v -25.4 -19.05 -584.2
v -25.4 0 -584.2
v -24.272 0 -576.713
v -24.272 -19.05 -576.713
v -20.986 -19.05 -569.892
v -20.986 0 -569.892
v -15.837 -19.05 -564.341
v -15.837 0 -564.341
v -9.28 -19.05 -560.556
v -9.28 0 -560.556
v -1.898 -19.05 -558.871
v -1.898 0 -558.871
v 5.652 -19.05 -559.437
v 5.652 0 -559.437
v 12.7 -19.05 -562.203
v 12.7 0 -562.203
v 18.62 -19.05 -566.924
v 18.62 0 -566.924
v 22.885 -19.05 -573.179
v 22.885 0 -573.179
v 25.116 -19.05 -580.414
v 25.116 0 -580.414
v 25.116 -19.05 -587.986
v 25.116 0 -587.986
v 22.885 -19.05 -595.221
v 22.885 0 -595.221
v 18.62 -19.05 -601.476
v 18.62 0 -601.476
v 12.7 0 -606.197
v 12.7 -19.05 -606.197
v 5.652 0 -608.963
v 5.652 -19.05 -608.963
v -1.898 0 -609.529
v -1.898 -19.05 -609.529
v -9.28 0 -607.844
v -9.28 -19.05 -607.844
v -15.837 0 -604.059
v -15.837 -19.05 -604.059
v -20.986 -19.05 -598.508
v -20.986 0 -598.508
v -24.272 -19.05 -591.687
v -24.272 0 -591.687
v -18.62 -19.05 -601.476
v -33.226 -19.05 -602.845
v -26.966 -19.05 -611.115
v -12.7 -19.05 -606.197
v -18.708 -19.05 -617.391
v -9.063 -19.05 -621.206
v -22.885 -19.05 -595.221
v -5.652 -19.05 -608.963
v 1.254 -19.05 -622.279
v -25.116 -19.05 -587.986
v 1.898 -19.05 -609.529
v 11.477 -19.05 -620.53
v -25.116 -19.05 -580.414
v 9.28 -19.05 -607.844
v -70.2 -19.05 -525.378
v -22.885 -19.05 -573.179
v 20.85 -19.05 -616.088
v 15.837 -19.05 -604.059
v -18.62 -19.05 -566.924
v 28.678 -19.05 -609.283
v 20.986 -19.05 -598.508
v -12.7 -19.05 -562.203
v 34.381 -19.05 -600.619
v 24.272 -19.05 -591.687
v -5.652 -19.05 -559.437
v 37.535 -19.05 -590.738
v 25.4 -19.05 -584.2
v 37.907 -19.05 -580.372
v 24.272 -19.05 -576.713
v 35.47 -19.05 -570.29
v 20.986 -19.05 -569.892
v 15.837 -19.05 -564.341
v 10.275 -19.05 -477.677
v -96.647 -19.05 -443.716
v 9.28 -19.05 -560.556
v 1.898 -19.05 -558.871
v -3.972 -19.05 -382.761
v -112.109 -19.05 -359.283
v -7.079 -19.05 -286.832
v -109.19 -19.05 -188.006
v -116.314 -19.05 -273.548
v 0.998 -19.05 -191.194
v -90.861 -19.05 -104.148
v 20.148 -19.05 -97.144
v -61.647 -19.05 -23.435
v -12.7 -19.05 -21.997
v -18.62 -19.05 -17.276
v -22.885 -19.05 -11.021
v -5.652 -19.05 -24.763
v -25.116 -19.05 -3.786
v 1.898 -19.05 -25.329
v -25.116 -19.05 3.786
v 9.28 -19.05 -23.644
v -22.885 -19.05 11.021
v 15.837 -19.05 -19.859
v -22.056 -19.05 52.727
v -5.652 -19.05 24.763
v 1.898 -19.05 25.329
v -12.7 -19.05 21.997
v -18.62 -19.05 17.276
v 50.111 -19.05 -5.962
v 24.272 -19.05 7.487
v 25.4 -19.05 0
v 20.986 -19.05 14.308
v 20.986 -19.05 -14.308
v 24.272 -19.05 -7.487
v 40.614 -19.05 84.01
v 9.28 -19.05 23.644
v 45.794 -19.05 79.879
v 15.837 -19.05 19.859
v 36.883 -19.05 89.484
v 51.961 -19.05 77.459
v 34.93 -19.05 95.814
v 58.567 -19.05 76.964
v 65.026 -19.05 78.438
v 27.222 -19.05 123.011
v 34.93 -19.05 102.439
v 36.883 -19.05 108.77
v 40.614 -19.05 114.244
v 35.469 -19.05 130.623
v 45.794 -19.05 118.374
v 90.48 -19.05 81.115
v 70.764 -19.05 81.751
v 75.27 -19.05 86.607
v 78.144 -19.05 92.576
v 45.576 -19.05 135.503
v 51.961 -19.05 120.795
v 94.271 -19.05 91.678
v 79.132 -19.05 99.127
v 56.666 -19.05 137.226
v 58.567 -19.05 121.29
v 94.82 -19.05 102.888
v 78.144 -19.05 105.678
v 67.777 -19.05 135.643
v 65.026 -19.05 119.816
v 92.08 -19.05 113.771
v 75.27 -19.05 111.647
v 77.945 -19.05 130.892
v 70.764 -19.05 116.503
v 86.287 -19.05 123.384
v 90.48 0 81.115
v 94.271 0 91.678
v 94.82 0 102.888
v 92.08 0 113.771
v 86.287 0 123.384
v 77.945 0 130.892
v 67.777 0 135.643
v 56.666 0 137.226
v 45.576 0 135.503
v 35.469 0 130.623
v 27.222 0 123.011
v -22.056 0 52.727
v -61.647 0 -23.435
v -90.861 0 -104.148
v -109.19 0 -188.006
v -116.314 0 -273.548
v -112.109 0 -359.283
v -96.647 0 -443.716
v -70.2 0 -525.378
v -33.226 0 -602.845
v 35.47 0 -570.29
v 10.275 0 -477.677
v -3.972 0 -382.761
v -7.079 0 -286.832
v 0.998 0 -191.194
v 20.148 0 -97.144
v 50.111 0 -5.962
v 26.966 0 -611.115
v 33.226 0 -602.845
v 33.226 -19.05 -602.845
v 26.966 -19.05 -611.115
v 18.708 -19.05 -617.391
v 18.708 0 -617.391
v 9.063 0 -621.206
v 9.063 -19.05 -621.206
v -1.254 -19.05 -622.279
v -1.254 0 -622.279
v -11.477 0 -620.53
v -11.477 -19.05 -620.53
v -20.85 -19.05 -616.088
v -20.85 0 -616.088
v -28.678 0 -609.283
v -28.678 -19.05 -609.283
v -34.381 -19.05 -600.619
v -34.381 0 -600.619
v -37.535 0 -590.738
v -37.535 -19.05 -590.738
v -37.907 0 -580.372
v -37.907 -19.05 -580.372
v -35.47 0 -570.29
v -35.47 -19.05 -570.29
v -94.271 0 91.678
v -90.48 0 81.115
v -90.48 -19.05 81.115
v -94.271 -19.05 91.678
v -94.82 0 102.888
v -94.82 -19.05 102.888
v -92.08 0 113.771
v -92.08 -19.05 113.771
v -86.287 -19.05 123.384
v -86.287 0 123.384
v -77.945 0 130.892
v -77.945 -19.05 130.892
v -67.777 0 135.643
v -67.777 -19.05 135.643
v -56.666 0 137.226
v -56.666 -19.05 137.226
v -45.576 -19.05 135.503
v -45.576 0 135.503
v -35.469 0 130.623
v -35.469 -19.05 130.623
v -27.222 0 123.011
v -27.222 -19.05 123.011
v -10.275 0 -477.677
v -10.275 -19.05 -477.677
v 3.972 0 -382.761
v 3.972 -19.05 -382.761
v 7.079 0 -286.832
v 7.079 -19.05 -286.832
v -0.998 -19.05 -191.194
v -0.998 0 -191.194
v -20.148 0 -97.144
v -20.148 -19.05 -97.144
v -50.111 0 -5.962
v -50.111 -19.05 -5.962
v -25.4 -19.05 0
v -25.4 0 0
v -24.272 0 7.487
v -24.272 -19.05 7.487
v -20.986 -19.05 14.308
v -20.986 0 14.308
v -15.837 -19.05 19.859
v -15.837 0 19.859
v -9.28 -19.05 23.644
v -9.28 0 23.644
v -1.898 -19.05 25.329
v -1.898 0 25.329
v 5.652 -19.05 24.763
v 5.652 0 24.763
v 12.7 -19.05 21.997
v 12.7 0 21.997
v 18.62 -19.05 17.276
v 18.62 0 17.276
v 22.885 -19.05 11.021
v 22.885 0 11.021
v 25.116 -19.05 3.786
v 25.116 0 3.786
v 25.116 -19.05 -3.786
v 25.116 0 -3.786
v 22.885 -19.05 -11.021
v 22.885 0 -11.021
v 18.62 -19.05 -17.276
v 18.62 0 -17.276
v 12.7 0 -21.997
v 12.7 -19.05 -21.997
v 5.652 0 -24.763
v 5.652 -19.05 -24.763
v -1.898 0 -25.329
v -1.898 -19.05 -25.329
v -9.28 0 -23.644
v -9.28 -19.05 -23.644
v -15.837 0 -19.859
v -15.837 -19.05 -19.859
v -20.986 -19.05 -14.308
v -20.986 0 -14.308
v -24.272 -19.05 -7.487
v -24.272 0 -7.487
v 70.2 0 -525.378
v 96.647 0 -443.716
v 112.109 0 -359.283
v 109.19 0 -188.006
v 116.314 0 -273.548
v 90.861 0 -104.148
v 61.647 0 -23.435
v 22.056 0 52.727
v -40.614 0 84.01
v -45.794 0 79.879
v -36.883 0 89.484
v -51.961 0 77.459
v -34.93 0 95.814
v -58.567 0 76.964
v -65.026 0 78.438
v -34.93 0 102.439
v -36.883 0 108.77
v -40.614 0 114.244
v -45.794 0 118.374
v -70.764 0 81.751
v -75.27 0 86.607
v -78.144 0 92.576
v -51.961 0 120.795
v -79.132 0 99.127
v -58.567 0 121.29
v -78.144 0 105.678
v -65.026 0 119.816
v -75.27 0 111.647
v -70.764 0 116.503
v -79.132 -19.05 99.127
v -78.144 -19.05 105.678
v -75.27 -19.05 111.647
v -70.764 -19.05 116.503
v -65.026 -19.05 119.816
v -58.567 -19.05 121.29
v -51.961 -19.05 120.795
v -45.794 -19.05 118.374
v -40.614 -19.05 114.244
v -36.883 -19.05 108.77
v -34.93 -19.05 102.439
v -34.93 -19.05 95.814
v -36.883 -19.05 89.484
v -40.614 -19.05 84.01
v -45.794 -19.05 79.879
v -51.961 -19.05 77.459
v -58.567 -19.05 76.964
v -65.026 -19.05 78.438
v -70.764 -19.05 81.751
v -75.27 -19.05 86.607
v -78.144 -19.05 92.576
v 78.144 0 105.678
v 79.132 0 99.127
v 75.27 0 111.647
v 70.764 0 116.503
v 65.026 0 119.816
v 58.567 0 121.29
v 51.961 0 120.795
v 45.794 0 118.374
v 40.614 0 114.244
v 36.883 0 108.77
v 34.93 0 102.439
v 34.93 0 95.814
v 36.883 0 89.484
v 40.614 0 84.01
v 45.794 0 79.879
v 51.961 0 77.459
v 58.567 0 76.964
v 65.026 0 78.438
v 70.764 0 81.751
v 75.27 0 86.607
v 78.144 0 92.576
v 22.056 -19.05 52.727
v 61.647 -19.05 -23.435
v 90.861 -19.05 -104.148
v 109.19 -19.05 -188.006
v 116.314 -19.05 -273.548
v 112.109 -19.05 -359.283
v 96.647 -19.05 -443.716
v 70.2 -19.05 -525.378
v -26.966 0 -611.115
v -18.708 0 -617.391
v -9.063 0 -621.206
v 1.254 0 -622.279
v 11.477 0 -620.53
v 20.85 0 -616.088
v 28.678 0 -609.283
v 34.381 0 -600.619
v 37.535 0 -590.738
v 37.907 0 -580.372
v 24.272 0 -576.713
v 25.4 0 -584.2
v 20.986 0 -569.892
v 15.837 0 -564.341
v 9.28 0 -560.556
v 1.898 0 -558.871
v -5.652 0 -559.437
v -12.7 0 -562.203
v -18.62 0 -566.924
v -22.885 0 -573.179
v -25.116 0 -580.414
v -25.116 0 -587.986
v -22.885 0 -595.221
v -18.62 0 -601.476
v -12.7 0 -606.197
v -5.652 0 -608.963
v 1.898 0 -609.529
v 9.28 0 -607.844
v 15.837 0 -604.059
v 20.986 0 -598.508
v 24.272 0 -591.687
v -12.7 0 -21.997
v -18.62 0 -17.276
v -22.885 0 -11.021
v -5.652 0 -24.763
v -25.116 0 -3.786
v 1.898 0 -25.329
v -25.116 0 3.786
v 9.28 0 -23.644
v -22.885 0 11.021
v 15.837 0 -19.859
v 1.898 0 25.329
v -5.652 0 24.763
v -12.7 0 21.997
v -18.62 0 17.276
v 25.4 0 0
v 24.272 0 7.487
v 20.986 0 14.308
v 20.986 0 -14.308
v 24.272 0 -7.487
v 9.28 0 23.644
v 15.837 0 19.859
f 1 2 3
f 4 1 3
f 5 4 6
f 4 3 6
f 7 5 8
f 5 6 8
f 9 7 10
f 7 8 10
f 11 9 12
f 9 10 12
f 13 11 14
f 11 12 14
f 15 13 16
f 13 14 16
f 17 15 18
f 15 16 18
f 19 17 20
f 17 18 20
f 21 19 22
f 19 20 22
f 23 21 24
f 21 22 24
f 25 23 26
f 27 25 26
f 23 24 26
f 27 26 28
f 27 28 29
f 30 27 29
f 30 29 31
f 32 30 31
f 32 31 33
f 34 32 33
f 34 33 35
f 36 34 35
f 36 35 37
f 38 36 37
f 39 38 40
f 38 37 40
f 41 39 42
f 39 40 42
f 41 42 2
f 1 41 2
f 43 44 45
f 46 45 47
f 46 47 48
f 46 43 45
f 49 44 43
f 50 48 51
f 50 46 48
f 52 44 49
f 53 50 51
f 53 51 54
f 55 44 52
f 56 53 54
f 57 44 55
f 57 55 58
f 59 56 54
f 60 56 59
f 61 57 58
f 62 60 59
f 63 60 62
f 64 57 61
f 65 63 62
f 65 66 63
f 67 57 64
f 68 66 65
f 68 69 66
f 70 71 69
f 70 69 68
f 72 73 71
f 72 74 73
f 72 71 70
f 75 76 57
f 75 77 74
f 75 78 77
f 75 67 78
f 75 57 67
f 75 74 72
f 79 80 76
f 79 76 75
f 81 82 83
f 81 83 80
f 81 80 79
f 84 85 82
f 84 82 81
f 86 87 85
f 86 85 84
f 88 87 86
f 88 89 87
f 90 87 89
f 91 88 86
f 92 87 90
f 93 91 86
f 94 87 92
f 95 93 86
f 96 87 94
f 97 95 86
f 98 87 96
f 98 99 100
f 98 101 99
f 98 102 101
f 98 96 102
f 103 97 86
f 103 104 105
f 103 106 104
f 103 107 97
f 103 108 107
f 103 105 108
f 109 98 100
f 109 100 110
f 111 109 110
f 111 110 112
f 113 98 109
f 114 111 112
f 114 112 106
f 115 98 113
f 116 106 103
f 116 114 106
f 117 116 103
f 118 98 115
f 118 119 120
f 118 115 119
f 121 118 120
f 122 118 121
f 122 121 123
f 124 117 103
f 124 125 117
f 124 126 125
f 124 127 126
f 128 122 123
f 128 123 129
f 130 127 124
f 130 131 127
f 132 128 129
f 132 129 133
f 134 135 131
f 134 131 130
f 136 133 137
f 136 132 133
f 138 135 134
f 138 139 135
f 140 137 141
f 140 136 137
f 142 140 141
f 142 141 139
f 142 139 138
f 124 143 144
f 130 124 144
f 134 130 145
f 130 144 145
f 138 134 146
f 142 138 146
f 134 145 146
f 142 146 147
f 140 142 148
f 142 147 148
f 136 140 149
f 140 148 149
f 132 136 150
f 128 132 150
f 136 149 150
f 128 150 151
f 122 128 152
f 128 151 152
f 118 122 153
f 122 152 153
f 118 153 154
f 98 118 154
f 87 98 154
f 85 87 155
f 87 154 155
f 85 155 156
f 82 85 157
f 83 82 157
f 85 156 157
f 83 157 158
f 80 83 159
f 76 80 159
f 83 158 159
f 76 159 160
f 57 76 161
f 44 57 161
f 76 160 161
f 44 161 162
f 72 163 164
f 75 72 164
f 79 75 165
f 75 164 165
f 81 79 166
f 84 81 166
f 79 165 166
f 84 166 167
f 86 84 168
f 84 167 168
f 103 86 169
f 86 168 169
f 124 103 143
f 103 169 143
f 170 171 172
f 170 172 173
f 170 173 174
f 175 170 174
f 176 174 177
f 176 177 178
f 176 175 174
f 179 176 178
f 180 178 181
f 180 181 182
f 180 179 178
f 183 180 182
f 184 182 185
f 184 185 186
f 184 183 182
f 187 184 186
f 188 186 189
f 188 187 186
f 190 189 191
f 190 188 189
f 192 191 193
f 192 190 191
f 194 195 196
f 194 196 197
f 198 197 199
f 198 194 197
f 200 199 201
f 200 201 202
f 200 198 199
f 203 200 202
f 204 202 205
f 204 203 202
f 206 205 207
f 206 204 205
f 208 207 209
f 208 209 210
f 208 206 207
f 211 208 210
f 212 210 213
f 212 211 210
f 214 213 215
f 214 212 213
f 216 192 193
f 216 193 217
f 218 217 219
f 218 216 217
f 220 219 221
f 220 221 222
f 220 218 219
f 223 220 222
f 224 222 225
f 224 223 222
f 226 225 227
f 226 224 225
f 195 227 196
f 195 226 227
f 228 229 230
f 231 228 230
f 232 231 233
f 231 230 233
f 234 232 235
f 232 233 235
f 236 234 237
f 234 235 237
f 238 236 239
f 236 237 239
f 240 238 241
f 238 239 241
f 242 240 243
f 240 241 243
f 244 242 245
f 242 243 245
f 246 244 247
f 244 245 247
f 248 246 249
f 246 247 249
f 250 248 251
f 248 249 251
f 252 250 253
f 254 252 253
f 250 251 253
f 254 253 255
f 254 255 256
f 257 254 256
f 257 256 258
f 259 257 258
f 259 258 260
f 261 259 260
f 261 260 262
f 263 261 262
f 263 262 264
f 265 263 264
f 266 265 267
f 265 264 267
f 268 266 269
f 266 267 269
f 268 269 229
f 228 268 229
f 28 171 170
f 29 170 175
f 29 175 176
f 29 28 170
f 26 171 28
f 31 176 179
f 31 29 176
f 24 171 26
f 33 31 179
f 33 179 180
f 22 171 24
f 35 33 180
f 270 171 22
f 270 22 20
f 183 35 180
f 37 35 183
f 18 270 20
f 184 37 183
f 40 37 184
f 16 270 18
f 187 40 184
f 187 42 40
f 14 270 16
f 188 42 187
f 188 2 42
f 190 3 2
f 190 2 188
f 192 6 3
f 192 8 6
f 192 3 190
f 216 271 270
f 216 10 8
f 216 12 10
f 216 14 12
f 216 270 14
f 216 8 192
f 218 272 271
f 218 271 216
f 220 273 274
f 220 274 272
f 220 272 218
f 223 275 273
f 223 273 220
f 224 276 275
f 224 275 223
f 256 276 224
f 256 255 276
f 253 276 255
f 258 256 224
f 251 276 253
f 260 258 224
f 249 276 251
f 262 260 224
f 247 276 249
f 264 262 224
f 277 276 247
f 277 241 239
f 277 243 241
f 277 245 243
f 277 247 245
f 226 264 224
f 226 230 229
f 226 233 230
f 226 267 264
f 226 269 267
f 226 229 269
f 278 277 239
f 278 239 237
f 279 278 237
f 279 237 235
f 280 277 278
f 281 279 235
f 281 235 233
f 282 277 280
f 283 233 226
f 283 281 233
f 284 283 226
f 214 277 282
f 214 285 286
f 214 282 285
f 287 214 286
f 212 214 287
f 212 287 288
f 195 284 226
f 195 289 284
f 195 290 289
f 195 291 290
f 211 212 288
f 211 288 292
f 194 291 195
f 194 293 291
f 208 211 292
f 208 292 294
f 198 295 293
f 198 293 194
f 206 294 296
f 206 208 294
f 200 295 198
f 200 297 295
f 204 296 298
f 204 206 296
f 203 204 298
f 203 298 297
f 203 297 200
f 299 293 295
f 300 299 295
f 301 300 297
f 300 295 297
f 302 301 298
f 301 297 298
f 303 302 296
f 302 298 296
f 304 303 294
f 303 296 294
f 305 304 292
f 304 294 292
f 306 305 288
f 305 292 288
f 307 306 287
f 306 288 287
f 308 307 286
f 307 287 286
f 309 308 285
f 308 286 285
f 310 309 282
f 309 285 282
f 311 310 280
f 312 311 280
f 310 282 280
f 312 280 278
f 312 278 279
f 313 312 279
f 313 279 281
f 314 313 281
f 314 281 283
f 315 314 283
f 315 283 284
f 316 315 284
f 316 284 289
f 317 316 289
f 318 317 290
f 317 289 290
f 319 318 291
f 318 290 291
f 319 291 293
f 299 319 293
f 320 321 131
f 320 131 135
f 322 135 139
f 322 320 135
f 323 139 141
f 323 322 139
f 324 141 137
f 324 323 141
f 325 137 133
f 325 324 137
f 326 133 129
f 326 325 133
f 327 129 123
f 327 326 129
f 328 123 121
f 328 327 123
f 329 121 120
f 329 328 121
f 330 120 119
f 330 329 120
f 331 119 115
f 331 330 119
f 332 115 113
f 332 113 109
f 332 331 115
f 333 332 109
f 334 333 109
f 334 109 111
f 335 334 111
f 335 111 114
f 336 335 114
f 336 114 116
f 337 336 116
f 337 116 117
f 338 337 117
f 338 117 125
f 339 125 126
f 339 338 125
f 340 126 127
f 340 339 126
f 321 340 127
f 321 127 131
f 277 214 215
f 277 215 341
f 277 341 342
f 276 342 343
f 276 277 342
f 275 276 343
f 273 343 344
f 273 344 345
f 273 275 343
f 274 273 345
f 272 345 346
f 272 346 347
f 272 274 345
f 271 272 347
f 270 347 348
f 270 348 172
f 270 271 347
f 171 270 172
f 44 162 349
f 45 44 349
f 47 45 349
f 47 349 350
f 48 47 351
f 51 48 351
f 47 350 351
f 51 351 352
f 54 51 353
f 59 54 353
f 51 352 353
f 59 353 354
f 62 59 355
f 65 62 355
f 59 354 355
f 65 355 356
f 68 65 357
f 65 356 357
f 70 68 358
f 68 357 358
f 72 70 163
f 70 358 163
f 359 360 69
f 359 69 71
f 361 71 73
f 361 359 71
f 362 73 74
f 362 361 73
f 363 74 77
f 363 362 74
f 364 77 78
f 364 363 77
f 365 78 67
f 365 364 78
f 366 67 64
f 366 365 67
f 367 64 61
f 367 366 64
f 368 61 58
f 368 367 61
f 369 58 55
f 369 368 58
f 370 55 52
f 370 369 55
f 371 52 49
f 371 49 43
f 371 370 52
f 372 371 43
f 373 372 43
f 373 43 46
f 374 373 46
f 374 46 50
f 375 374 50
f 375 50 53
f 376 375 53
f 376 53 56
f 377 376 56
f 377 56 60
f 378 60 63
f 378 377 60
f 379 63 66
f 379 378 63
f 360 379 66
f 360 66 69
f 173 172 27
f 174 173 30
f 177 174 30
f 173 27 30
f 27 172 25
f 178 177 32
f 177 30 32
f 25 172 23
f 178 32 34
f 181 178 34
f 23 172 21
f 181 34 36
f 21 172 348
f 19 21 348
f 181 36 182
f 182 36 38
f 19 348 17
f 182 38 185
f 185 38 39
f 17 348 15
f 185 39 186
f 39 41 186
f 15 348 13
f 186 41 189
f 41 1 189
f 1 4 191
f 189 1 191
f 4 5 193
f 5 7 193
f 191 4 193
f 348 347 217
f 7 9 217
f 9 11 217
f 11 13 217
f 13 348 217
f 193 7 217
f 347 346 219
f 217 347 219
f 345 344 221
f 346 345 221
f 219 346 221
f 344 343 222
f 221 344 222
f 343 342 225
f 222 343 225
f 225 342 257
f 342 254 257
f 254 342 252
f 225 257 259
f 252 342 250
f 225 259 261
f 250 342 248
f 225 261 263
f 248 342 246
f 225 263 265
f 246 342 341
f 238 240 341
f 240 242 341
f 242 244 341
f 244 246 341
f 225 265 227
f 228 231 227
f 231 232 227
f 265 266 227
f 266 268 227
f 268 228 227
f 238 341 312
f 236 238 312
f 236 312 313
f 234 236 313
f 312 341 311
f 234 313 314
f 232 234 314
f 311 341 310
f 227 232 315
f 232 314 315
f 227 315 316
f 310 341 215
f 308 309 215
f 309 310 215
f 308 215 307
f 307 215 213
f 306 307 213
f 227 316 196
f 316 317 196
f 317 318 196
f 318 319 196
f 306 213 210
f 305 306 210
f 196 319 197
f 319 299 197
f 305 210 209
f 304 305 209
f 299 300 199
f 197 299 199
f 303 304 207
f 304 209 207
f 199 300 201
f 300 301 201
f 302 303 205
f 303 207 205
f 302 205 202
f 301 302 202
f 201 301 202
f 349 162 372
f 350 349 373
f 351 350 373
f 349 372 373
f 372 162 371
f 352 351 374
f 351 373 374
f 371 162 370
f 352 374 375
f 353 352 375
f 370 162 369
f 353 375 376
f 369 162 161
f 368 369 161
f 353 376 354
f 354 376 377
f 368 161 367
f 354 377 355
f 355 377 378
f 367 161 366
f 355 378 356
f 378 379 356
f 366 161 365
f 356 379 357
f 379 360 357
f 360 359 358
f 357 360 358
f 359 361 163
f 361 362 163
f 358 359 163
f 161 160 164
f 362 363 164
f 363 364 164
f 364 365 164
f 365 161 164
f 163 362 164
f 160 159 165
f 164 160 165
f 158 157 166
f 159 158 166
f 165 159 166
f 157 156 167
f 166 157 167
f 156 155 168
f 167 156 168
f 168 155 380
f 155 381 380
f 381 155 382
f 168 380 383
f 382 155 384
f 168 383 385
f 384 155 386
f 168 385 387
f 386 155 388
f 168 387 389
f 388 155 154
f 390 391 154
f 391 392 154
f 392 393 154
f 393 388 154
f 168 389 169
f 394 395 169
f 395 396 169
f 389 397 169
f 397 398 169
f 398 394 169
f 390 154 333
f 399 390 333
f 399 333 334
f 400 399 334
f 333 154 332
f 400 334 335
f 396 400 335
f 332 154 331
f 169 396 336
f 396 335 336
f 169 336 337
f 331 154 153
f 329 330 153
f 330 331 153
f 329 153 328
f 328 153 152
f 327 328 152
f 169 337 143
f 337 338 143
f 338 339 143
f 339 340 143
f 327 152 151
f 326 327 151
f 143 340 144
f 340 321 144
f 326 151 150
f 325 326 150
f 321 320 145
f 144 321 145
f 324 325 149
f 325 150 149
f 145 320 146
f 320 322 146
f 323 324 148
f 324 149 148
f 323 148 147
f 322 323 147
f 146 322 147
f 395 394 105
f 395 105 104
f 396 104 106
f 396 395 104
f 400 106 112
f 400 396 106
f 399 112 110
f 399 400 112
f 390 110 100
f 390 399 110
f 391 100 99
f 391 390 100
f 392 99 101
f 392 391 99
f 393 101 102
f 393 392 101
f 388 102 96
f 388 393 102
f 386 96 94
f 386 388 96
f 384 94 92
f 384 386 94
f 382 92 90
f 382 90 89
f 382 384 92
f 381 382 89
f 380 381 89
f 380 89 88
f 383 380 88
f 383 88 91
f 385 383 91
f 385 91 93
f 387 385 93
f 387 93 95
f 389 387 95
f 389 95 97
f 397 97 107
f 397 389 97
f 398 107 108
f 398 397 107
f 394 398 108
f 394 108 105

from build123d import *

# Parameters (mm, degrees)
F0_R     = 25.4
F0_R_2   = 22.225
F1_DEPTH = 19.05


with BuildPart() as f1:
    # F0 (on Front) → F1 (new body)
    with BuildSketch(Plane.XZ):
        with BuildLine():
            ThreePointArc((27.221969, 123.01068), (-114.165221, -230.659491), (-33.226283, -602.844681))
            ThreePointArc((-33.226283, -602.844681), (16.315724, -618.629742), (35.470201, -570.290476))
            ThreePointArc((35.470201, -570.290476), (-4.434873, -238.895265), (90.47992, 81.114709))
            ThreePointArc((90.47992, 81.114709), (77.944569, 130.891805), (27.221969, 123.01068))
        make_face()
        with Locations((0, -584.2)):
            Circle(F0_R, mode=Mode.SUBTRACT)
        Circle(F0_R, mode=Mode.SUBTRACT)
        with Locations((56.906536, 99.126869)):
            Circle(F0_R_2, mode=Mode.SUBTRACT)
    extrude(amount=F1_DEPTH)


with BuildPart() as f2_1:
    # F2: instance of F1
    add(f1.part.mirror(Plane.YZ))


solid = Compound([f1.part, f2_1.part])
